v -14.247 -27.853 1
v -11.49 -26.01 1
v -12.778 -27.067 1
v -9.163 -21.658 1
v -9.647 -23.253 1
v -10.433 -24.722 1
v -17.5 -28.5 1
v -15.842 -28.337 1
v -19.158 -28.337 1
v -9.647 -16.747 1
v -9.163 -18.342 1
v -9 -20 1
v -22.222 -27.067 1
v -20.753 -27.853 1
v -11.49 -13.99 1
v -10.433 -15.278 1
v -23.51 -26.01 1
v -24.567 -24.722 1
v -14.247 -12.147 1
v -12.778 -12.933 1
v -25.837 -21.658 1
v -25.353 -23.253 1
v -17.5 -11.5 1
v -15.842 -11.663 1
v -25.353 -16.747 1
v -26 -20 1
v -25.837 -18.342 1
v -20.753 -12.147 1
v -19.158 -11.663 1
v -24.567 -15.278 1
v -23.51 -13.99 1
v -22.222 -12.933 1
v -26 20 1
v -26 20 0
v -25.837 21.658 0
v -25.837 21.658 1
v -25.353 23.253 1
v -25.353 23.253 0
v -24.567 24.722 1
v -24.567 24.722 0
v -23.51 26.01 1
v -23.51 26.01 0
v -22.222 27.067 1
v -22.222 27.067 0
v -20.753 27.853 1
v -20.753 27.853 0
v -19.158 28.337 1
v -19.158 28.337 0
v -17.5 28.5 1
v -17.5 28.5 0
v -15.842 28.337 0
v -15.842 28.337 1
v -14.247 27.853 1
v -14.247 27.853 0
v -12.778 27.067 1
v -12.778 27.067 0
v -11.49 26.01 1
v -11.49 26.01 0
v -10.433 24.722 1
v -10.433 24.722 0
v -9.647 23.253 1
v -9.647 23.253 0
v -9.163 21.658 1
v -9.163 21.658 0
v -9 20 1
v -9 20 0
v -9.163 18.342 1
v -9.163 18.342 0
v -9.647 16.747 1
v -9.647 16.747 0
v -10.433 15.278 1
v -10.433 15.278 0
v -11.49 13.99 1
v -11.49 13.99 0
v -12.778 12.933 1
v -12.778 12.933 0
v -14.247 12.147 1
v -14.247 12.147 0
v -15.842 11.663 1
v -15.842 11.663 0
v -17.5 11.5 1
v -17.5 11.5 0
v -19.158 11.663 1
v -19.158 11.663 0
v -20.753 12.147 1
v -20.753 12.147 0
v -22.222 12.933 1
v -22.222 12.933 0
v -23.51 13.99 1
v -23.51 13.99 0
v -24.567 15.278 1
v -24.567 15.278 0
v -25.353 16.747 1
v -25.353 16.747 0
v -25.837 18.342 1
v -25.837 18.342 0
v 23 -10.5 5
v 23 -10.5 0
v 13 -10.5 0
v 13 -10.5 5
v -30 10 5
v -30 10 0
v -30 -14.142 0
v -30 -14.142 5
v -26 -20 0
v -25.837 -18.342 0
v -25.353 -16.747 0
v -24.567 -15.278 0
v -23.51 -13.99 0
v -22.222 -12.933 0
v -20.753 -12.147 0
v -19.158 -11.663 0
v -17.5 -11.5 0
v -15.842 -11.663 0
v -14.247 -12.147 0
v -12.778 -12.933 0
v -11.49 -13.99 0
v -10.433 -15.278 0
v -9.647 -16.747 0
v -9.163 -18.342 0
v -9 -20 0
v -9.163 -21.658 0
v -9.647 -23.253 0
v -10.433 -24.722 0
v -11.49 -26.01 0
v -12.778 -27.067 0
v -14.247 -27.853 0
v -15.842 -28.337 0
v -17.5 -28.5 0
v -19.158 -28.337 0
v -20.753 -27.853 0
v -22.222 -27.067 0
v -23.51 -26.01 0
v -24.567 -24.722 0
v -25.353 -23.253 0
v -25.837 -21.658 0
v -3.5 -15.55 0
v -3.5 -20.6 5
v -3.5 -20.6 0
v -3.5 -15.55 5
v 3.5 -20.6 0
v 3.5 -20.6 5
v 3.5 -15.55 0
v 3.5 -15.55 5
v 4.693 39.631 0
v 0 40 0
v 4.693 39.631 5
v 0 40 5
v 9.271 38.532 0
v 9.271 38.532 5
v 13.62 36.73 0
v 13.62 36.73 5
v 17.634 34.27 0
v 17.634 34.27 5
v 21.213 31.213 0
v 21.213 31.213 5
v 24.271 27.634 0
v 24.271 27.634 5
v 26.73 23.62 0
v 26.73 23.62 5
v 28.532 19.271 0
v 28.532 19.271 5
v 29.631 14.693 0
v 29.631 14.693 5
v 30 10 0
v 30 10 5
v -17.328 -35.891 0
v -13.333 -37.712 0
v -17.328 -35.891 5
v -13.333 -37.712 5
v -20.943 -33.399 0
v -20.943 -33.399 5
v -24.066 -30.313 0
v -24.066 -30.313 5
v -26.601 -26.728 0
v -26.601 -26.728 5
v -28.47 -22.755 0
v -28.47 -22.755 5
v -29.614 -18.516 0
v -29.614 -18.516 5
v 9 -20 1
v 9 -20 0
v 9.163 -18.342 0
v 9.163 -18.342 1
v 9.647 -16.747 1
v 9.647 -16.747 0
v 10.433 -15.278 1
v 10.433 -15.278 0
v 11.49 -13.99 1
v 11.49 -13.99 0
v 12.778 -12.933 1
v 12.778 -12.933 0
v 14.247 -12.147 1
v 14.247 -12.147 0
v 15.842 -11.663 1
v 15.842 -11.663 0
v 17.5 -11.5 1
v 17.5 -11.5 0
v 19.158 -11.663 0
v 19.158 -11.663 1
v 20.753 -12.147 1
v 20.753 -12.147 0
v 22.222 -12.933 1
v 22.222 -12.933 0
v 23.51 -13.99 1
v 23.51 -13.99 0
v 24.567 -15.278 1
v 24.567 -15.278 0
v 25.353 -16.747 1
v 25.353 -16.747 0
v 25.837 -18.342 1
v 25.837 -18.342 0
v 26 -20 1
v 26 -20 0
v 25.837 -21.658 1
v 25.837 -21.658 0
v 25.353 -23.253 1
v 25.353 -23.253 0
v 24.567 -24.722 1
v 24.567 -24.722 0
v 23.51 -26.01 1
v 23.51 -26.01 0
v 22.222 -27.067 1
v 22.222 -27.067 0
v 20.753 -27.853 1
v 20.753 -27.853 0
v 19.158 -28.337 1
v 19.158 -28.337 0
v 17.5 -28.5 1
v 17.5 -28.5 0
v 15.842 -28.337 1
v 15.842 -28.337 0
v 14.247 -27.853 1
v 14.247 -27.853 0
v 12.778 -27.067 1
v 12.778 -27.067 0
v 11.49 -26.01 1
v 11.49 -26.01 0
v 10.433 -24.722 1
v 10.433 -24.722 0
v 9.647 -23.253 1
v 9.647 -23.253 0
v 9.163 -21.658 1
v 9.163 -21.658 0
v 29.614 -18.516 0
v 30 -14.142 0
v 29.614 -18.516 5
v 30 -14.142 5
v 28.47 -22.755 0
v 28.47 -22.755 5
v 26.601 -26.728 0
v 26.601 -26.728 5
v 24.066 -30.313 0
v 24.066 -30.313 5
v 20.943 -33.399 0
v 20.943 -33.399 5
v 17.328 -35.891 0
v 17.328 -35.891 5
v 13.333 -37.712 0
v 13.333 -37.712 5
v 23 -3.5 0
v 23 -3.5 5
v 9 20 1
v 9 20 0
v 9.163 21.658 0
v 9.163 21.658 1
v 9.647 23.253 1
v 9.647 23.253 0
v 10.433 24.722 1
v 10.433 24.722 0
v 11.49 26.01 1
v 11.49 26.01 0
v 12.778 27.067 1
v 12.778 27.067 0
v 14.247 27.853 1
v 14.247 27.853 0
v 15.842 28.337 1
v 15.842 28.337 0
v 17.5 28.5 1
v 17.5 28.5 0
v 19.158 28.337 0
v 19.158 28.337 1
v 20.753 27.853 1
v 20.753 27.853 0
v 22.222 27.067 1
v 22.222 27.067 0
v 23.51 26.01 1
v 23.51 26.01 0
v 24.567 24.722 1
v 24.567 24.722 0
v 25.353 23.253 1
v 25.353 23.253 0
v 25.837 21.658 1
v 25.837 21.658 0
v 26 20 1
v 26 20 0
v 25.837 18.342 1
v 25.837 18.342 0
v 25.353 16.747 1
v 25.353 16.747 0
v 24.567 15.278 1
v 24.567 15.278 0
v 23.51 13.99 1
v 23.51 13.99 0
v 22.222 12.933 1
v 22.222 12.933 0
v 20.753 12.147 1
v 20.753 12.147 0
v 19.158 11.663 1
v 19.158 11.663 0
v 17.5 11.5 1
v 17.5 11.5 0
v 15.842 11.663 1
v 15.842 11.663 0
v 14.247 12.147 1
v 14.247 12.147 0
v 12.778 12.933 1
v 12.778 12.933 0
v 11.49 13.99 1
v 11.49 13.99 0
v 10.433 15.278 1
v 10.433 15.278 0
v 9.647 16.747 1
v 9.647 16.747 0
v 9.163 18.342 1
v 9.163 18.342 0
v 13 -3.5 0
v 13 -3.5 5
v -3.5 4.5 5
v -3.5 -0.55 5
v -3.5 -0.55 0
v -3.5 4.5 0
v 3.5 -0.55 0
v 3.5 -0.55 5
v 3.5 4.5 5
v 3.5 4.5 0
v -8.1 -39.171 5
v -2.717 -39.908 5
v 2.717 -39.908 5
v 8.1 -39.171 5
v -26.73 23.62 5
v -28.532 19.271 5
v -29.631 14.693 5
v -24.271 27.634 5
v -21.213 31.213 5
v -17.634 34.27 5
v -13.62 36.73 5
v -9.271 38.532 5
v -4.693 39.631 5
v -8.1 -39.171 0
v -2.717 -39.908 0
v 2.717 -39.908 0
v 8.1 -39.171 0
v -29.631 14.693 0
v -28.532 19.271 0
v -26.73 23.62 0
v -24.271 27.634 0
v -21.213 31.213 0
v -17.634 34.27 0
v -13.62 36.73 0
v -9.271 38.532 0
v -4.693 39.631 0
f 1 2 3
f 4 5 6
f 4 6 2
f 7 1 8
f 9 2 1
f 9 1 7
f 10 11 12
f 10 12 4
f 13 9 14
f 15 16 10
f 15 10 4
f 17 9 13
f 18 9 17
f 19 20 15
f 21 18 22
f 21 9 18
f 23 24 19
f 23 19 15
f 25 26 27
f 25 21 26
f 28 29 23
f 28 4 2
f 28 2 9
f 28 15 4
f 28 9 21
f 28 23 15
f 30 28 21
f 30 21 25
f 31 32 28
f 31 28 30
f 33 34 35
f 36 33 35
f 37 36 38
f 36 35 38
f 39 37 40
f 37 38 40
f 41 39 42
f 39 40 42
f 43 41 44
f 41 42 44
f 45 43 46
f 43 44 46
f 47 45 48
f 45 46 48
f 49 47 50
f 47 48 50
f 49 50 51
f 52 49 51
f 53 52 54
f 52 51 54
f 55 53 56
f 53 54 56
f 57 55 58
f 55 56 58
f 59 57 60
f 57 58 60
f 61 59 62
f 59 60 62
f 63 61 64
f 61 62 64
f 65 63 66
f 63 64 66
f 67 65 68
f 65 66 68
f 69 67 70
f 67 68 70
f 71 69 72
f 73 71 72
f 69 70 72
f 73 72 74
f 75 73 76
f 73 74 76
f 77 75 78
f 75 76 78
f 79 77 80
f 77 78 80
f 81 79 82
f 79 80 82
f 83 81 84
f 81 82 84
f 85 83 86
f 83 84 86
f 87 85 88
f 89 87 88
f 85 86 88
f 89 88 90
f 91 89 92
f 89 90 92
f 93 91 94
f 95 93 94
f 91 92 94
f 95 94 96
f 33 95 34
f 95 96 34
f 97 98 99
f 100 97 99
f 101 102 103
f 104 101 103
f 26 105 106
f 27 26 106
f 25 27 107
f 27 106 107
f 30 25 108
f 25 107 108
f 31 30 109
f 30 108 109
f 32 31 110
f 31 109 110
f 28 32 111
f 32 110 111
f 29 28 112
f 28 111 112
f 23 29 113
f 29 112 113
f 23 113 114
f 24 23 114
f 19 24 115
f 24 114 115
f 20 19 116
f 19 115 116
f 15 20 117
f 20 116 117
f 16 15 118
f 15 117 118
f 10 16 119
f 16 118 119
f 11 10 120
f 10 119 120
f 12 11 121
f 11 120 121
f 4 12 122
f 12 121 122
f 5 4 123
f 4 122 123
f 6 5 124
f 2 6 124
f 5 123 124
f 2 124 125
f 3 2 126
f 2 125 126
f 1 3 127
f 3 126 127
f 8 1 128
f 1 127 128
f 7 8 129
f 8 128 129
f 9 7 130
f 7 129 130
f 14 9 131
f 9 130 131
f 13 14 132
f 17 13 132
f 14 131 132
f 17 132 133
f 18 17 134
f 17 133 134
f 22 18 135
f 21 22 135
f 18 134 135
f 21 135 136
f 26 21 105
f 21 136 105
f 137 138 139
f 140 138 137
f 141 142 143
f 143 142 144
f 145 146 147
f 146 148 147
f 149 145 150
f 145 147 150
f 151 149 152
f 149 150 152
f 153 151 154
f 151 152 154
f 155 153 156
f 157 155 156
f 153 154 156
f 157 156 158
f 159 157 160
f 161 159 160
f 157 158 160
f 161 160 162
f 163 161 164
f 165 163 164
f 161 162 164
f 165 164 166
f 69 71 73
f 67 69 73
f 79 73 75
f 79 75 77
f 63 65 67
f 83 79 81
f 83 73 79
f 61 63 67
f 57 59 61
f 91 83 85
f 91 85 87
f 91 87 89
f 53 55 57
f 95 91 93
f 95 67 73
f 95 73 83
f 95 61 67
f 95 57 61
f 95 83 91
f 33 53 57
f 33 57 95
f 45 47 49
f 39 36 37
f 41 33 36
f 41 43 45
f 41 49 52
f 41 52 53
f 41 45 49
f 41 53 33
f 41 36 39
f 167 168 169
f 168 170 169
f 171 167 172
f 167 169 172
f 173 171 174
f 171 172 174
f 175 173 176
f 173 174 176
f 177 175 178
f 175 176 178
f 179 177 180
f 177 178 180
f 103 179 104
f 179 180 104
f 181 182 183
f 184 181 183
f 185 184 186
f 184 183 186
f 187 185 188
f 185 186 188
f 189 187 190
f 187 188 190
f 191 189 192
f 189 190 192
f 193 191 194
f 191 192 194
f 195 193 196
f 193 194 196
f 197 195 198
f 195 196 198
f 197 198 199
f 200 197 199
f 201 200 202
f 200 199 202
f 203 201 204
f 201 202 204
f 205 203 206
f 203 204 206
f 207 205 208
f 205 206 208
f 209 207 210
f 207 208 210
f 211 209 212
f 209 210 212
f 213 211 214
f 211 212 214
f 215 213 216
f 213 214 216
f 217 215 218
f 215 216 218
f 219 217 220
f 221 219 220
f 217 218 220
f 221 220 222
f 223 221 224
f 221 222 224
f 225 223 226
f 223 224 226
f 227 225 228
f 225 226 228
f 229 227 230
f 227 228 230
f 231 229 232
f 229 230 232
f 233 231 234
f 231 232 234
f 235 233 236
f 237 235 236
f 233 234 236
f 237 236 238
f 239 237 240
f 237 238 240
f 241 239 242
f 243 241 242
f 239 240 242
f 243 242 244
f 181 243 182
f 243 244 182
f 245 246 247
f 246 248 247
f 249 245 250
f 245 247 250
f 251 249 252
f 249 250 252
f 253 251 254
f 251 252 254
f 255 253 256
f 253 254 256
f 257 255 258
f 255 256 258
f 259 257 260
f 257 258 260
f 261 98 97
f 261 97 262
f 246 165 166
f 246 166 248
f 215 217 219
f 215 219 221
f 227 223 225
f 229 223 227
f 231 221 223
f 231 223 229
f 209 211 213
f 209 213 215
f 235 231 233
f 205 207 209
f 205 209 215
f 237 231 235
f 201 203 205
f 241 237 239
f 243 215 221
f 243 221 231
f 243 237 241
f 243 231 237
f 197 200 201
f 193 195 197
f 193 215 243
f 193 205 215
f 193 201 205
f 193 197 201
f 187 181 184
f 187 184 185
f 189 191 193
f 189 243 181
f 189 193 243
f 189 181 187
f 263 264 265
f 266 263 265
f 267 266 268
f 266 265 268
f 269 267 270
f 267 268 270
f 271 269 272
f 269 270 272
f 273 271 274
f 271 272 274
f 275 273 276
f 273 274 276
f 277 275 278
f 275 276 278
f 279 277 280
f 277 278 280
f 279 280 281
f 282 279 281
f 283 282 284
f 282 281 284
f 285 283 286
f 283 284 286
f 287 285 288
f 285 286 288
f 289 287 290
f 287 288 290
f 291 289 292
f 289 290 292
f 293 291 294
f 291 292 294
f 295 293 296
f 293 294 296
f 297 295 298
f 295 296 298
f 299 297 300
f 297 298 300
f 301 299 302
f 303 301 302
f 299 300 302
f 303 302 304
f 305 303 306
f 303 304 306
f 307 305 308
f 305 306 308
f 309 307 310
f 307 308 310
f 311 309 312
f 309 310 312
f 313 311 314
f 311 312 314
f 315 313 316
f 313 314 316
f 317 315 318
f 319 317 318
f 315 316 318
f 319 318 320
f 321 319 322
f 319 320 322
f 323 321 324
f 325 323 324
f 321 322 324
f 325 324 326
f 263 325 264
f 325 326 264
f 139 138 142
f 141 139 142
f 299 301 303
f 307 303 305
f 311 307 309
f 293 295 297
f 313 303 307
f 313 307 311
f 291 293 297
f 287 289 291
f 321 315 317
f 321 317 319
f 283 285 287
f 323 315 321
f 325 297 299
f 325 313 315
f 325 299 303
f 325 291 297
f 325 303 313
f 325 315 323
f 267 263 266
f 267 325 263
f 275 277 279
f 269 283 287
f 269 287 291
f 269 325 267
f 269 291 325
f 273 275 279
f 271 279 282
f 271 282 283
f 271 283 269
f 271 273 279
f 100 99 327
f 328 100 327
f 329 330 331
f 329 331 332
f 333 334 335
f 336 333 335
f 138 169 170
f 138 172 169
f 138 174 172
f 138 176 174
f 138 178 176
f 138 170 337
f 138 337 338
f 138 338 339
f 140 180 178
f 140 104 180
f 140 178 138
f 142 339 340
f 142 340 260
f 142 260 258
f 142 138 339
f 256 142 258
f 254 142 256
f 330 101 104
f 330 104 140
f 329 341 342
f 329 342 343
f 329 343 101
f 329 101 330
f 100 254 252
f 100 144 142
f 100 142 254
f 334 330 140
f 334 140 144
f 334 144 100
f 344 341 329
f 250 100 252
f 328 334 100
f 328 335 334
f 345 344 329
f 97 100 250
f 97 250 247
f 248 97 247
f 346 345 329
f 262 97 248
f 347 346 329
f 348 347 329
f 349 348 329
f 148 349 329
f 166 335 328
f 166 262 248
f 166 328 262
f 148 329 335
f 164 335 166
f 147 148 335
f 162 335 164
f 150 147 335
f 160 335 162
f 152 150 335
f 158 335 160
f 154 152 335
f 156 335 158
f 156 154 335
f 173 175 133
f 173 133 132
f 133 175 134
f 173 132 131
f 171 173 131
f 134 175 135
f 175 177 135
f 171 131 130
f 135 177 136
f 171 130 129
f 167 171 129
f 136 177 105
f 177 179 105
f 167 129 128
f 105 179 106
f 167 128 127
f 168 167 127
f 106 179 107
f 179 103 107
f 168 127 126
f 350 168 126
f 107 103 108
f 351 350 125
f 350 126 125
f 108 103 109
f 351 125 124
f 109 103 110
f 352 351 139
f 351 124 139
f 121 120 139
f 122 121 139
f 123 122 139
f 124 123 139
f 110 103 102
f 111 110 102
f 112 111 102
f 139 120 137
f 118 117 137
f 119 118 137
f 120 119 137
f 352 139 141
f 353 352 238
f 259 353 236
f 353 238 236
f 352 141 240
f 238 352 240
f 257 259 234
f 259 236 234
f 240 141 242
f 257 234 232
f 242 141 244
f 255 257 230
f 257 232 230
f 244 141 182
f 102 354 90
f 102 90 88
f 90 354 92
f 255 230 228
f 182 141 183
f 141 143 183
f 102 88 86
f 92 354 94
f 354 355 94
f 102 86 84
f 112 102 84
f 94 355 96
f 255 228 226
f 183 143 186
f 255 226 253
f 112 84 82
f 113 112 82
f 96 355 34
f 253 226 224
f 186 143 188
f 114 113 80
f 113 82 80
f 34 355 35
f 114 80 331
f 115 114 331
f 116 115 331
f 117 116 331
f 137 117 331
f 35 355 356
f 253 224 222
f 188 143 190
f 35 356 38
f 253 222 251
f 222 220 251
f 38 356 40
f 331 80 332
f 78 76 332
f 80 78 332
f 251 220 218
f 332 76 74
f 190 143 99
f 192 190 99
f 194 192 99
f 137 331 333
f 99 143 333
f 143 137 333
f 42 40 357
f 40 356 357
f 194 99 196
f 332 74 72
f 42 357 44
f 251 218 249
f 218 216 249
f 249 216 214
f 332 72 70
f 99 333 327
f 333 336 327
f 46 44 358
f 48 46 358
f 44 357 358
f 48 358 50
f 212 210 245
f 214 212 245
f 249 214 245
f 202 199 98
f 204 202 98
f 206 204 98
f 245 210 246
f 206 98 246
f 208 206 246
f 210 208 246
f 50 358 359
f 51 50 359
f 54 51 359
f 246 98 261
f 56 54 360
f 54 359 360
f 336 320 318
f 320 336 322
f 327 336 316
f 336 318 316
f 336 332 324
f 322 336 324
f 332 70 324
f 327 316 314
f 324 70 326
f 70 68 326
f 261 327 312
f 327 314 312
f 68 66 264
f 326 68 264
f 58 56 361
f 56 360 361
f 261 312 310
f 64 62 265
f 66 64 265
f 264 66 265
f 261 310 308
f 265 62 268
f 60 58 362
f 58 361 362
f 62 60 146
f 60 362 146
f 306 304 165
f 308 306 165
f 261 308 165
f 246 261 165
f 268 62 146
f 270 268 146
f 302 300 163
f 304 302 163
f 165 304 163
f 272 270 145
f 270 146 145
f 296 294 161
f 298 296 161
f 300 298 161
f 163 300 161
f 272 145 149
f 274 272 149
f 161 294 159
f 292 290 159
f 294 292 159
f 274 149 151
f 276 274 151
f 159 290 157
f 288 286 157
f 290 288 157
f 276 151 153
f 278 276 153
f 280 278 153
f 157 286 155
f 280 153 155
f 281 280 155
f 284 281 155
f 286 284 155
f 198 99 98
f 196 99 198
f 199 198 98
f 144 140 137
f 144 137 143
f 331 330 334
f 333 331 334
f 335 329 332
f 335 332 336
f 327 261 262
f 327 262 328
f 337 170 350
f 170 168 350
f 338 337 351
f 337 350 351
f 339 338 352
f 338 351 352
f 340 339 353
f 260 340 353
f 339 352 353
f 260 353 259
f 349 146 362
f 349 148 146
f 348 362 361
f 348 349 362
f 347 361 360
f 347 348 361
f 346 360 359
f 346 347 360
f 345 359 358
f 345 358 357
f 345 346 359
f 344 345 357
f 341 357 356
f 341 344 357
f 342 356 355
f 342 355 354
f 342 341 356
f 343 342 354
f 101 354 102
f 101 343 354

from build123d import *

# Parameters (mm, degrees)
SKETCH1_R           = 40
BOSS_EXTRUDE1_DEPTH = 5
CUT_EXTRUDE3_START  = -10
CUT_EXTRUDE3_DEPTH  = 10
FILLET1_R           = 30
FILLET2_R           = 25
SKETCH14_W          = 7
SKETCH14_H          = 5.05
CUT_EXTRUDE4_DEPTH  = 10
SKETCH18_W          = 10
SKETCH18_H          = 7
CUT_EXTRUDE6_DEPTH  = 10
SKETCH20_R          = 8.5
CUT_EXTRUDE8_DEPTH  = 1


with BuildPart() as part:
    # Sketch1 → Boss-Extrude1 (new body)
    with BuildSketch(Plane.XY):
        Circle(SKETCH1_R)
    extrude(amount=BOSS_EXTRUDE1_DEPTH)

    # Sketch10 → Cut-Extrude3 (cut)
    with BuildSketch(Plane.XY.offset(5).offset(CUT_EXTRUDE3_START)):
        with BuildLine():
            Line((-30, 26.457513111), (-30, -26.457513111))
            ThreePointArc((-30, -26.457513111), (-40, 0), (-30, 26.457513111))
        make_face()
        with BuildLine():
            Line((30, 26.457513111), (30, -26.457513111))
            ThreePointArc((30, -26.457513111), (40, 0), (30, 26.457513111))
        make_face()
    extrude(amount=CUT_EXTRUDE3_DEPTH, mode=Mode.SUBTRACT)

    # Fillet1
    fillet1_edges = [part.edges().sort_by_distance(p)[0] for p in [
        (-30, 26.457513111, 2.5),
        (30, 26.457513111, 2.5),
    ]]
    fillet(fillet1_edges, radius=FILLET1_R - 0.0001)  # a hair under: the kernel refuses the full size

    # Fillet2
    fillet2_edges = [part.edges().sort_by_distance(p)[0] for p in [
        (-30, -26.457513111, 2.5),
        (30, -26.457513111, 2.5),
    ]]
    fillet(fillet2_edges, radius=FILLET2_R)

    # Sketch14 → Cut-Extrude4 (cut)
    with BuildSketch(Plane.XY.offset(5)):
        with Locations((0, 1.975)):
            Rectangle(SKETCH14_W, SKETCH14_H)
        with Locations((0, -18.075)):
            Rectangle(SKETCH14_W, SKETCH14_H)
    extrude(amount=-CUT_EXTRUDE4_DEPTH, mode=Mode.SUBTRACT)

    # Sketch18 → Cut-Extrude6 (cut)
    with BuildSketch(Plane(origin=(0, 0, 0), x_dir=(-1, 0, 0), z_dir=(0, 0, -1))):
        with Locations((-18, -7)):
            Rectangle(SKETCH18_W, SKETCH18_H)
    extrude(amount=-CUT_EXTRUDE6_DEPTH, mode=Mode.SUBTRACT)

    # Sketch20 → Cut-Extrude8 (cut)
    with BuildSketch(Plane(origin=(0, 0, 0), x_dir=(-1, 0, 0), z_dir=(0, 0, -1))):
        with Locations((-17.5, 20)):
            Circle(SKETCH20_R)
        with Locations((17.5, 20)):
            Circle(SKETCH20_R)
        with Locations((17.5, -20)):
            Circle(SKETCH20_R)
        with Locations((-17.5, -20)):
            Circle(SKETCH20_R)
    extrude(amount=-CUT_EXTRUDE8_DEPTH, mode=Mode.SUBTRACT)


solid = part.part
